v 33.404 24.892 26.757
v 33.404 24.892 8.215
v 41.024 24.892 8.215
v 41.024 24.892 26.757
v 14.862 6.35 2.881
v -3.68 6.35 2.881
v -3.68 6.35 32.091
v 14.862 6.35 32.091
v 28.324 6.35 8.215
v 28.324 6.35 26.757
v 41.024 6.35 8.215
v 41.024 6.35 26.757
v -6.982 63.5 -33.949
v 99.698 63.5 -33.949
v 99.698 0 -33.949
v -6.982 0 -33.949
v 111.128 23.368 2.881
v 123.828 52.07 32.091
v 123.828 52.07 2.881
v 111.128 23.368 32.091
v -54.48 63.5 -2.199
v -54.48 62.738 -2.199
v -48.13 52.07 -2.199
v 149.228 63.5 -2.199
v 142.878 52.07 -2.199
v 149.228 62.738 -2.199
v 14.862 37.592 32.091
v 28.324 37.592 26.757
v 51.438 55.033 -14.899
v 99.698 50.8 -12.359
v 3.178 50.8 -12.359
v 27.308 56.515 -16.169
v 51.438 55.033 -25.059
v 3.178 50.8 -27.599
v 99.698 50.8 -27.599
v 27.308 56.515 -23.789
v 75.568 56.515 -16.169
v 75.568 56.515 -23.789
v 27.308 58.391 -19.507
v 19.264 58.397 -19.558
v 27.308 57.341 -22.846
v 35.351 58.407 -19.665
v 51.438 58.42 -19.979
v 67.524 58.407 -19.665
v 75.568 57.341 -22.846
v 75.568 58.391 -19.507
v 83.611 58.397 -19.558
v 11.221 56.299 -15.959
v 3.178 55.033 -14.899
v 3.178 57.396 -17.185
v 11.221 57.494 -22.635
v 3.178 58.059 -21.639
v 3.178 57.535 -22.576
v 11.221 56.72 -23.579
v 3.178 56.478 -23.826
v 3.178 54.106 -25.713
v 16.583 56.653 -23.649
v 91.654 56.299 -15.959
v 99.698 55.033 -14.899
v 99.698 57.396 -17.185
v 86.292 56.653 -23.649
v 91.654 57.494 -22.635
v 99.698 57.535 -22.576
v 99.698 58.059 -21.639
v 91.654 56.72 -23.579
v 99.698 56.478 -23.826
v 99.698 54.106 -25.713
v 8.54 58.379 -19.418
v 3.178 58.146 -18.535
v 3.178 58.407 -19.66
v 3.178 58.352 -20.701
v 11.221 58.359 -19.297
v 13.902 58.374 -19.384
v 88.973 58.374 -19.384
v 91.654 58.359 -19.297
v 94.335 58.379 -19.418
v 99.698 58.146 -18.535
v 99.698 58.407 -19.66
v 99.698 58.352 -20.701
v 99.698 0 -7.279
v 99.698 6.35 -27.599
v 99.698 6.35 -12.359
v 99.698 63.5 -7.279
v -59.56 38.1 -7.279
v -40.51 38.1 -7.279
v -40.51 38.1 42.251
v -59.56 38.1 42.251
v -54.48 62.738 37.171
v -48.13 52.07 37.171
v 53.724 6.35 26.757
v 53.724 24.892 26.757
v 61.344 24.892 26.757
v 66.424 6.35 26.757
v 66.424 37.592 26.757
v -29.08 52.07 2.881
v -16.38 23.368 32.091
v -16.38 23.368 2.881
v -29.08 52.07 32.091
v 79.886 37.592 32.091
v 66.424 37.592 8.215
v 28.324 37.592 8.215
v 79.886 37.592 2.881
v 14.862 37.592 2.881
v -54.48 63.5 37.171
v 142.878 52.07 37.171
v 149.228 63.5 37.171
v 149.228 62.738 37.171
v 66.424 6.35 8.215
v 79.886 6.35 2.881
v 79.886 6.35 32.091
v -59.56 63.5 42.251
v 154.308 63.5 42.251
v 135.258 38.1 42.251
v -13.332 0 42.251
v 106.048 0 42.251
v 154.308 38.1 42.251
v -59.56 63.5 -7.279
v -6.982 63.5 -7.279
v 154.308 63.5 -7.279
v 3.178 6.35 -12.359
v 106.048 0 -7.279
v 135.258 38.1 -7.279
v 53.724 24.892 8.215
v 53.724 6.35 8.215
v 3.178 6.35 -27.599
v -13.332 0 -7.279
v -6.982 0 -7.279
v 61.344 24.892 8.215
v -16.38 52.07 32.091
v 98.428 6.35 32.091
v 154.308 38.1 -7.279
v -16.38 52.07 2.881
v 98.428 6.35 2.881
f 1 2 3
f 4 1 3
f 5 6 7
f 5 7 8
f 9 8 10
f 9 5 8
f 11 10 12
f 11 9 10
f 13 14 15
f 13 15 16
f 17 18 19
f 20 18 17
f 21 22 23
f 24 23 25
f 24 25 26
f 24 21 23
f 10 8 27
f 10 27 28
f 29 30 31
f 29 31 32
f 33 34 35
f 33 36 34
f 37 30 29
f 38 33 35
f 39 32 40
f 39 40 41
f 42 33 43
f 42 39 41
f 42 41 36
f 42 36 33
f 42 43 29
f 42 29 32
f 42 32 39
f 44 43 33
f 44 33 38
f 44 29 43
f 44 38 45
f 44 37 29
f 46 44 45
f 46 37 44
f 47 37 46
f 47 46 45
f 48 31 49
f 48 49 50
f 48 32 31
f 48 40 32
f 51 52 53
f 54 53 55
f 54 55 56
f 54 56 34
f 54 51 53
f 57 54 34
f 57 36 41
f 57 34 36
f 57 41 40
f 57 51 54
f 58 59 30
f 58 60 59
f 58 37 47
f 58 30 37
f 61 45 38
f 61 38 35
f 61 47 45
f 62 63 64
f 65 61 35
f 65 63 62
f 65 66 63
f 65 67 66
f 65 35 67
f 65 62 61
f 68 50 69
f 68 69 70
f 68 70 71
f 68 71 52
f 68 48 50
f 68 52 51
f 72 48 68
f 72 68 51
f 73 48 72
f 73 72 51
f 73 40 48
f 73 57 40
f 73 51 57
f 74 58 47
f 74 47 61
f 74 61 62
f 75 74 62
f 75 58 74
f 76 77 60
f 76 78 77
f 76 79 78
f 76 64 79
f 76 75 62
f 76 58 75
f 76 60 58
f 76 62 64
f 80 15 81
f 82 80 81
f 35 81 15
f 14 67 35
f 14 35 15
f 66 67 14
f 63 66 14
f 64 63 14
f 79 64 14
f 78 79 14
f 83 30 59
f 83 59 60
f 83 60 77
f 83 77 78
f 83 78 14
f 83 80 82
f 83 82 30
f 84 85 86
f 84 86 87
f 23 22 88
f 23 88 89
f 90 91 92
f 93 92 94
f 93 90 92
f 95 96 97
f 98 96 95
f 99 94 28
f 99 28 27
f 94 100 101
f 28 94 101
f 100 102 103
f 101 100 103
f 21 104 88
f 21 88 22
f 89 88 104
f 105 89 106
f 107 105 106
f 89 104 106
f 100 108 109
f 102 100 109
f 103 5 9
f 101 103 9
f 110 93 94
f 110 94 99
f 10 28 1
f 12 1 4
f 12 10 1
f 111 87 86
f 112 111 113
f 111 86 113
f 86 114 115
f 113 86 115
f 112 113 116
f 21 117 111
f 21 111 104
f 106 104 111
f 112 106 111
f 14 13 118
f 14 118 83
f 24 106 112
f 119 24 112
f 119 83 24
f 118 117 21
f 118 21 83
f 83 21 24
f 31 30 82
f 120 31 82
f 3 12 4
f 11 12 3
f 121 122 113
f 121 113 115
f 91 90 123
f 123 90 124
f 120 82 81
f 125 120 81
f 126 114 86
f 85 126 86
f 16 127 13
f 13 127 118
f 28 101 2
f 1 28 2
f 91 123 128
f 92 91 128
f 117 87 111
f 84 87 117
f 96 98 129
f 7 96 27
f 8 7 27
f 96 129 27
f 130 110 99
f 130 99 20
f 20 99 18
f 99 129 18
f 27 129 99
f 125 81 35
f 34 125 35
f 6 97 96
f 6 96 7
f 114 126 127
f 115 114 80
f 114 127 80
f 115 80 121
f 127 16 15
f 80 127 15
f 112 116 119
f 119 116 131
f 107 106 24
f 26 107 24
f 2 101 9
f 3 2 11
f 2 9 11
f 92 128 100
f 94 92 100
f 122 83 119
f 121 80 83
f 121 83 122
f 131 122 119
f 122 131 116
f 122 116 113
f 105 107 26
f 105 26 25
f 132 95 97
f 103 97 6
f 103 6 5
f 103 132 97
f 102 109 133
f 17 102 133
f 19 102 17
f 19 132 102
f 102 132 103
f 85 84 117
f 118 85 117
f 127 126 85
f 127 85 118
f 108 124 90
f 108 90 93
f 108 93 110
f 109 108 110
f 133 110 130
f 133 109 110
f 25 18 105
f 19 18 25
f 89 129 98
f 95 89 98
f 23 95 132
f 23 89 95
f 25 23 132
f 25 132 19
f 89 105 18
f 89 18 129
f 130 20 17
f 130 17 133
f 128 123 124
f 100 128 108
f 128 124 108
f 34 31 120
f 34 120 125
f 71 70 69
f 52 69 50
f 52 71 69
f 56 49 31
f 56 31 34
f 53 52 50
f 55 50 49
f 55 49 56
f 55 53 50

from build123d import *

# Parameters (mm, degrees)
SKETCH1_W            = 213.868
SKETCH1_H            = 49.53
BOSS_EXTRUDE1_DEPTH  = 63.5
SKETCH2_W            = 203.708
SKETCH2_H            = 39.37
CUT_EXTRUDE1_DEPTH   = 11.43
SKETCH3_W            = 191.008
SKETCH3_H            = 29.21
CUT_EXTRUDE2_DEPTH   = 45.72
SKETCH5_W            = 29.21
SKETCH5_H            = 45.72
BOSS_EXTRUDE2_DEPTH  = 31.75
SKETCH7_W            = 29.21
SKETCH7_H            = 45.802108617
BOSS_EXTRUDE3_DEPTH  = 31.75
BOSS_EXTRUDE4_DEPTH  = 40.64
BOSS_EXTRUDE5_DEPTH  = 40.64
SKETCH20_W           = 12.7
SKETCH20_H           = 29.21
BOSS_EXTRUDE6_DEPTH  = 18.542
BOSS_EXTRUDE7_DEPTH  = 30.48
SKETCH22_W           = 106.68
SKETCH22_H           = 63.5
BOSS_EXTRUDE8_DEPTH  = 26.67
CUT_EXTRUDE11_DEPTH  = 96.52
CUT_EXTRUDE5_DEPTH   = 49.53
SKETCH28_W           = 12.7
SKETCH28_H           = 29.21
CUT_EXTRUDE6_DEPTH   = 28.702
BOSS_EXTRUDE9_DEPTH  = 29.21
SKETCH30_W           = 12.7
SKETCH30_H           = 29.21
CUT_EXTRUDE7_DEPTH   = 28.702
BOSS_EXTRUDE11_DEPTH = 29.21
BOSS_EXTRUDE12_DEPTH = 29.21
CUT_EXTRUDE8_DEPTH   = 49.53
BOSS_EXTRUDE13_DEPTH = 29.21
CUT_EXTRUDE9_DEPTH   = 50.8
CUT_EXTRUDE12_DEPTH  = 49.53
SKETCH48_W           = 12.7
SKETCH48_H           = 5.334
BOSS_EXTRUDE14_DEPTH = 31.242
BOSS_EXTRUDE17_DEPTH = 31.242
SKETCH52_W           = 12.7
SKETCH52_H           = 5.334
BOSS_EXTRUDE18_DEPTH = 31.242
BOSS_EXTRUDE19_DEPTH = 31.242
SKETCH54_W           = 12.7
SKETCH54_H           = 5.334
BOSS_EXTRUDE20_DEPTH = 31.242
BOSS_EXTRUDE21_DEPTH = 31.242
SKETCH56_W           = 12.7
SKETCH56_H           = 5.334
BOSS_EXTRUDE22_DEPTH = 31.242
BOSS_EXTRUDE23_DEPTH = 31.242


with BuildPart() as part:
    # Sketch1 → Boss-Extrude1 (new body)
    with BuildSketch(Plane(origin=(0, 0, 0), x_dir=(1, 0, 0), z_dir=(0, 1, 0))):
        with Locations((47.373649513, -17.485904033)):
            Rectangle(SKETCH1_W, SKETCH1_H)
    extrude(amount=BOSS_EXTRUDE1_DEPTH)

    # Sketch2 → Cut-Extrude1 (cut)
    with BuildSketch(Plane(origin=(0, 63.5, 0), x_dir=(1, 0, 0), z_dir=(0, 1, 0))):
        with Locations((47.373649513, -17.485904033)):
            Rectangle(SKETCH2_W, SKETCH2_H)
    extrude(amount=-CUT_EXTRUDE1_DEPTH, mode=Mode.SUBTRACT)

    # Sketch3 → Cut-Extrude2 (cut)
    with BuildSketch(Plane(origin=(0, 52.07, 0), x_dir=(1, 0, 0), z_dir=(0, 1, 0))):
        with Locations((47.373649513, -17.485904033)):
            Rectangle(SKETCH3_W, SKETCH3_H)
    extrude(amount=-CUT_EXTRUDE2_DEPTH, mode=Mode.SUBTRACT)

    # Sketch5 → Boss-Extrude2 (add)
    with BuildSketch(Plane.ZY.offset(-142.877649513)):
        with Locations((17.485904033, 29.21)):
            Rectangle(SKETCH5_W, SKETCH5_H)
    extrude(amount=BOSS_EXTRUDE2_DEPTH)

    # Sketch7 → Boss-Extrude3 (add)
    with BuildSketch(Plane(origin=(-48.130350487, 0, 0), x_dir=(0, 0, -1), z_dir=(1, 0, 0))):
        with Locations((-17.485904033, 29.168945691)):
            Rectangle(SKETCH7_W, SKETCH7_H)
    extrude(amount=BOSS_EXTRUDE3_DEPTH)

    # Sketch13 → Boss-Extrude4 (add)
    with BuildSketch(Plane.XY.offset(-2.199095967)):
        Polygon((-54.480350487, 62.738), (-48.130350487, 52.07), (-54.480350487, 52.07), align=None)
    extrude(amount=BOSS_EXTRUDE4_DEPTH)

    # Sketch19 → Boss-Extrude5 (add)
    with BuildSketch(Plane(origin=(0, 0, 37.170904033), x_dir=(-1, 0, 0), z_dir=(0, 0, -1))):
        Polygon((-149.227649513, 62.738), (-142.877649513, 52.07), (-149.227649513, 52.07), align=None)
    extrude(amount=BOSS_EXTRUDE5_DEPTH)

    # Sketch20 → Boss-Extrude6 (add)
    with BuildSketch(Plane(origin=(0, 6.35, 0), x_dir=(1, 0, 0), z_dir=(0, 1, 0))):
        with Locations((47.373649513, -17.485904033)):
            Rectangle(SKETCH20_W, SKETCH20_H)
    extrude(amount=BOSS_EXTRUDE6_DEPTH)

    # Sketch21 → Boss-Extrude7 (add)
    with BuildSketch(Plane.XY.offset(2.880904033)):
        Polygon((66.423649513, 37.592), (28.323649513, 37.592), (33.403649513, 24.892), (41.023649513, 24.892), (53.723649513, 24.892), (61.343649513, 24.892), align=None)
    extrude(amount=BOSS_EXTRUDE7_DEPTH)

    # Sketch22 → Boss-Extrude8 (add)
    with BuildSketch(Plane(origin=(0, 0, -7.279095967), x_dir=(-1, 0, 0), z_dir=(0, 0, -1))):
        with Locations((-46.357649513, 31.75)):
            Rectangle(SKETCH22_W, SKETCH22_H)
    extrude(amount=BOSS_EXTRUDE8_DEPTH)

    # Sketch39 → Cut-Extrude11 (cut)
    with BuildSketch(Plane(origin=(99.697649513, 0, 0), x_dir=(0, 0, -1), z_dir=(1, 0, 0))):
        with BuildLine():
            add(Edge.make_bspline(
                [(12.359095967, 50.8), (19.979095967, 66.04), (27.599095967, 50.8)],
                knots=[0, 0, 0, 1, 1, 1], degree=2))
            Line((12.359095967, 50.8), (12.359095967, 6.35))
            Line((12.359095967, 6.35), (13.629095967, 6.35))
            Line((13.629095967, 6.35), (26.329095967, 6.35))
            Line((26.329095967, 6.35), (27.599095967, 6.35))
            Line((27.599095967, 6.35), (27.599095967, 50.8))
        make_face()
    extrude(amount=-CUT_EXTRUDE11_DEPTH, mode=Mode.SUBTRACT)

    # Sketch26 → Cut-Extrude5 (cut)
    with BuildSketch(Plane(origin=(0, 0, -7.279095967), x_dir=(-1, 0, 0), z_dir=(0, 0, -1))):
        Polygon((-154.307649513, 38.1), (-106.047649513, 0), (-154.307649513, 0), align=None)
    extrude(amount=-CUT_EXTRUDE5_DEPTH, mode=Mode.SUBTRACT)

    # Sketch28 → Cut-Extrude6 (cut)
    with BuildSketch(Plane(origin=(0, 52.07, 0), x_dir=(1, 0, 0), z_dir=(0, 1, 0))):
        with Locations((117.477649513, -17.485904033)):
            Rectangle(SKETCH28_W, SKETCH28_H)
    extrude(amount=-CUT_EXTRUDE6_DEPTH, mode=Mode.SUBTRACT)

    # Sketch29 → Boss-Extrude9 (add)
    with BuildSketch(Plane(origin=(0, 0, 32.090904033), x_dir=(-1, 0, 0), z_dir=(0, 0, -1))):
        Polygon((-123.827649513, 52.07), (-111.127649513, 23.368), (-123.827649513, 23.368), align=None)
    extrude(amount=BOSS_EXTRUDE9_DEPTH)

    # Sketch30 → Cut-Extrude7 (cut)
    with BuildSketch(Plane(origin=(0, 52.07, 0), x_dir=(1, 0, 0), z_dir=(0, 1, 0))):
        with Locations((-22.730350487, -17.485904033)):
            Rectangle(SKETCH30_W, SKETCH30_H)
    extrude(amount=-CUT_EXTRUDE7_DEPTH, mode=Mode.SUBTRACT)

    # Sketch31 → Boss-Extrude11 (add)
    with BuildSketch(Plane(origin=(0, 0, 32.090904033), x_dir=(-1, 0, 0), z_dir=(0, 0, -1))):
        Polygon((16.380350487, 23.368), (29.080350487, 52.07), (29.080350487, 23.368), align=None)
    extrude(amount=BOSS_EXTRUDE11_DEPTH)

    # Sketch33 → Boss-Extrude12 (add)
    with BuildSketch(Plane(origin=(0, 0, 32.090904033), x_dir=(-1, 0, 0), z_dir=(0, 0, -1))):
        Polygon((-111.127649513, 23.368), (-98.427649513, 6.35), (-111.127649513, 6.35), align=None)
    extrude(amount=BOSS_EXTRUDE12_DEPTH)

    # Sketch34 → Cut-Extrude8 (cut)
    with BuildSketch(Plane(origin=(0, 0, -7.279095967), x_dir=(-1, 0, 0), z_dir=(0, 0, -1))):
        Polygon((-154.307649513, 38.1), (-135.257649513, 38.1), (-106.047649513, 0), align=None)
    extrude(amount=-CUT_EXTRUDE8_DEPTH, mode=Mode.SUBTRACT)

    # Sketch35 → Boss-Extrude13 (add)
    with BuildSketch(Plane(origin=(0, 0, 32.090904033), x_dir=(-1, 0, 0), z_dir=(0, 0, -1))):
        Polygon((16.380350487, 23.368), (3.680350487, 6.35), (16.380350487, 6.35), align=None)
    extrude(amount=BOSS_EXTRUDE13_DEPTH)

    # Sketch37 → Cut-Extrude9 (cut)
    with BuildSketch(Plane(origin=(0, 0, -7.279095967), x_dir=(-1, 0, 0), z_dir=(0, 0, -1))):
        Polygon((13.332350487, 0), (59.560350487, 38.1), (59.560350487, 0), align=None)
    extrude(amount=-CUT_EXTRUDE9_DEPTH, mode=Mode.SUBTRACT)

    # Sketch40 → Cut-Extrude12 (cut)
    with BuildSketch(Plane(origin=(0, 0, -7.279095967), x_dir=(-1, 0, 0), z_dir=(0, 0, -1))):
        Polygon((40.510350487, 38.1), (59.560350487, 38.1), (13.332350487, 0), align=None)
    extrude(amount=-CUT_EXTRUDE12_DEPTH, mode=Mode.SUBTRACT)

    # Sketch48 → Boss-Extrude14 (add)
    with BuildSketch(Plane(origin=(0, 6.35, 0), x_dir=(1, 0, 0), z_dir=(0, 1, 0))):
        with Locations((34.673649513, -5.547904033)):
            Rectangle(SKETCH48_W, SKETCH48_H)
    extrude(amount=BOSS_EXTRUDE14_DEPTH)

    # Sketch51 → Boss-Extrude17 (add)
    with BuildSketch(Plane(origin=(0, 6.35, 0), x_dir=(1, 0, 0), z_dir=(0, 1, 0))):
        Polygon((14.861649513, -2.880904033), (28.323649513, -8.214904033), (28.323649513, -2.880904033), align=None)
    extrude(amount=BOSS_EXTRUDE17_DEPTH)

    # Sketch52 → Boss-Extrude18 (add)
    with BuildSketch(Plane(origin=(0, 6.35, 0), x_dir=(1, 0, 0), z_dir=(0, 1, 0))):
        with Locations((34.673649513, -29.423904033)):
            Rectangle(SKETCH52_W, SKETCH52_H)
    extrude(amount=BOSS_EXTRUDE18_DEPTH)

    # Sketch53 → Boss-Extrude19 (add)
    with BuildSketch(Plane(origin=(0, 6.35, 0), x_dir=(1, 0, 0), z_dir=(0, 1, 0))):
        Polygon((14.861649513, -32.090904033), (28.323649513, -26.756904033), (28.323649513, -32.090904033), align=None)
    extrude(amount=BOSS_EXTRUDE19_DEPTH)

    # Sketch54 → Boss-Extrude20 (add)
    with BuildSketch(Plane(origin=(0, 6.35, 0), x_dir=(1, 0, 0), z_dir=(0, 1, 0))):
        with Locations((60.073649513, -5.547904033)):
            Rectangle(SKETCH54_W, SKETCH54_H)
    extrude(amount=BOSS_EXTRUDE20_DEPTH)

    # Sketch55 → Boss-Extrude21 (add)
    with BuildSketch(Plane(origin=(0, 6.35, 0), x_dir=(1, 0, 0), z_dir=(0, 1, 0))):
        Polygon((66.423649513, -8.214904033), (79.885649513, -2.880904033), (66.423649513, -2.880904033), align=None)
    extrude(amount=BOSS_EXTRUDE21_DEPTH)

    # Sketch56 → Boss-Extrude22 (add)
    with BuildSketch(Plane(origin=(0, 6.35, 0), x_dir=(1, 0, 0), z_dir=(0, 1, 0))):
        with Locations((60.073649513, -29.423904033)):
            Rectangle(SKETCH56_W, SKETCH56_H)
    extrude(amount=BOSS_EXTRUDE22_DEPTH)

    # Sketch57 → Boss-Extrude23 (add)
    with BuildSketch(Plane(origin=(0, 6.35, 0), x_dir=(1, 0, 0), z_dir=(0, 1, 0))):
        Polygon((66.423649513, -26.756904033), (79.885649513, -32.090904033), (66.423649513, -32.090904033), align=None)
    extrude(amount=BOSS_EXTRUDE23_DEPTH)


solid = part.part
